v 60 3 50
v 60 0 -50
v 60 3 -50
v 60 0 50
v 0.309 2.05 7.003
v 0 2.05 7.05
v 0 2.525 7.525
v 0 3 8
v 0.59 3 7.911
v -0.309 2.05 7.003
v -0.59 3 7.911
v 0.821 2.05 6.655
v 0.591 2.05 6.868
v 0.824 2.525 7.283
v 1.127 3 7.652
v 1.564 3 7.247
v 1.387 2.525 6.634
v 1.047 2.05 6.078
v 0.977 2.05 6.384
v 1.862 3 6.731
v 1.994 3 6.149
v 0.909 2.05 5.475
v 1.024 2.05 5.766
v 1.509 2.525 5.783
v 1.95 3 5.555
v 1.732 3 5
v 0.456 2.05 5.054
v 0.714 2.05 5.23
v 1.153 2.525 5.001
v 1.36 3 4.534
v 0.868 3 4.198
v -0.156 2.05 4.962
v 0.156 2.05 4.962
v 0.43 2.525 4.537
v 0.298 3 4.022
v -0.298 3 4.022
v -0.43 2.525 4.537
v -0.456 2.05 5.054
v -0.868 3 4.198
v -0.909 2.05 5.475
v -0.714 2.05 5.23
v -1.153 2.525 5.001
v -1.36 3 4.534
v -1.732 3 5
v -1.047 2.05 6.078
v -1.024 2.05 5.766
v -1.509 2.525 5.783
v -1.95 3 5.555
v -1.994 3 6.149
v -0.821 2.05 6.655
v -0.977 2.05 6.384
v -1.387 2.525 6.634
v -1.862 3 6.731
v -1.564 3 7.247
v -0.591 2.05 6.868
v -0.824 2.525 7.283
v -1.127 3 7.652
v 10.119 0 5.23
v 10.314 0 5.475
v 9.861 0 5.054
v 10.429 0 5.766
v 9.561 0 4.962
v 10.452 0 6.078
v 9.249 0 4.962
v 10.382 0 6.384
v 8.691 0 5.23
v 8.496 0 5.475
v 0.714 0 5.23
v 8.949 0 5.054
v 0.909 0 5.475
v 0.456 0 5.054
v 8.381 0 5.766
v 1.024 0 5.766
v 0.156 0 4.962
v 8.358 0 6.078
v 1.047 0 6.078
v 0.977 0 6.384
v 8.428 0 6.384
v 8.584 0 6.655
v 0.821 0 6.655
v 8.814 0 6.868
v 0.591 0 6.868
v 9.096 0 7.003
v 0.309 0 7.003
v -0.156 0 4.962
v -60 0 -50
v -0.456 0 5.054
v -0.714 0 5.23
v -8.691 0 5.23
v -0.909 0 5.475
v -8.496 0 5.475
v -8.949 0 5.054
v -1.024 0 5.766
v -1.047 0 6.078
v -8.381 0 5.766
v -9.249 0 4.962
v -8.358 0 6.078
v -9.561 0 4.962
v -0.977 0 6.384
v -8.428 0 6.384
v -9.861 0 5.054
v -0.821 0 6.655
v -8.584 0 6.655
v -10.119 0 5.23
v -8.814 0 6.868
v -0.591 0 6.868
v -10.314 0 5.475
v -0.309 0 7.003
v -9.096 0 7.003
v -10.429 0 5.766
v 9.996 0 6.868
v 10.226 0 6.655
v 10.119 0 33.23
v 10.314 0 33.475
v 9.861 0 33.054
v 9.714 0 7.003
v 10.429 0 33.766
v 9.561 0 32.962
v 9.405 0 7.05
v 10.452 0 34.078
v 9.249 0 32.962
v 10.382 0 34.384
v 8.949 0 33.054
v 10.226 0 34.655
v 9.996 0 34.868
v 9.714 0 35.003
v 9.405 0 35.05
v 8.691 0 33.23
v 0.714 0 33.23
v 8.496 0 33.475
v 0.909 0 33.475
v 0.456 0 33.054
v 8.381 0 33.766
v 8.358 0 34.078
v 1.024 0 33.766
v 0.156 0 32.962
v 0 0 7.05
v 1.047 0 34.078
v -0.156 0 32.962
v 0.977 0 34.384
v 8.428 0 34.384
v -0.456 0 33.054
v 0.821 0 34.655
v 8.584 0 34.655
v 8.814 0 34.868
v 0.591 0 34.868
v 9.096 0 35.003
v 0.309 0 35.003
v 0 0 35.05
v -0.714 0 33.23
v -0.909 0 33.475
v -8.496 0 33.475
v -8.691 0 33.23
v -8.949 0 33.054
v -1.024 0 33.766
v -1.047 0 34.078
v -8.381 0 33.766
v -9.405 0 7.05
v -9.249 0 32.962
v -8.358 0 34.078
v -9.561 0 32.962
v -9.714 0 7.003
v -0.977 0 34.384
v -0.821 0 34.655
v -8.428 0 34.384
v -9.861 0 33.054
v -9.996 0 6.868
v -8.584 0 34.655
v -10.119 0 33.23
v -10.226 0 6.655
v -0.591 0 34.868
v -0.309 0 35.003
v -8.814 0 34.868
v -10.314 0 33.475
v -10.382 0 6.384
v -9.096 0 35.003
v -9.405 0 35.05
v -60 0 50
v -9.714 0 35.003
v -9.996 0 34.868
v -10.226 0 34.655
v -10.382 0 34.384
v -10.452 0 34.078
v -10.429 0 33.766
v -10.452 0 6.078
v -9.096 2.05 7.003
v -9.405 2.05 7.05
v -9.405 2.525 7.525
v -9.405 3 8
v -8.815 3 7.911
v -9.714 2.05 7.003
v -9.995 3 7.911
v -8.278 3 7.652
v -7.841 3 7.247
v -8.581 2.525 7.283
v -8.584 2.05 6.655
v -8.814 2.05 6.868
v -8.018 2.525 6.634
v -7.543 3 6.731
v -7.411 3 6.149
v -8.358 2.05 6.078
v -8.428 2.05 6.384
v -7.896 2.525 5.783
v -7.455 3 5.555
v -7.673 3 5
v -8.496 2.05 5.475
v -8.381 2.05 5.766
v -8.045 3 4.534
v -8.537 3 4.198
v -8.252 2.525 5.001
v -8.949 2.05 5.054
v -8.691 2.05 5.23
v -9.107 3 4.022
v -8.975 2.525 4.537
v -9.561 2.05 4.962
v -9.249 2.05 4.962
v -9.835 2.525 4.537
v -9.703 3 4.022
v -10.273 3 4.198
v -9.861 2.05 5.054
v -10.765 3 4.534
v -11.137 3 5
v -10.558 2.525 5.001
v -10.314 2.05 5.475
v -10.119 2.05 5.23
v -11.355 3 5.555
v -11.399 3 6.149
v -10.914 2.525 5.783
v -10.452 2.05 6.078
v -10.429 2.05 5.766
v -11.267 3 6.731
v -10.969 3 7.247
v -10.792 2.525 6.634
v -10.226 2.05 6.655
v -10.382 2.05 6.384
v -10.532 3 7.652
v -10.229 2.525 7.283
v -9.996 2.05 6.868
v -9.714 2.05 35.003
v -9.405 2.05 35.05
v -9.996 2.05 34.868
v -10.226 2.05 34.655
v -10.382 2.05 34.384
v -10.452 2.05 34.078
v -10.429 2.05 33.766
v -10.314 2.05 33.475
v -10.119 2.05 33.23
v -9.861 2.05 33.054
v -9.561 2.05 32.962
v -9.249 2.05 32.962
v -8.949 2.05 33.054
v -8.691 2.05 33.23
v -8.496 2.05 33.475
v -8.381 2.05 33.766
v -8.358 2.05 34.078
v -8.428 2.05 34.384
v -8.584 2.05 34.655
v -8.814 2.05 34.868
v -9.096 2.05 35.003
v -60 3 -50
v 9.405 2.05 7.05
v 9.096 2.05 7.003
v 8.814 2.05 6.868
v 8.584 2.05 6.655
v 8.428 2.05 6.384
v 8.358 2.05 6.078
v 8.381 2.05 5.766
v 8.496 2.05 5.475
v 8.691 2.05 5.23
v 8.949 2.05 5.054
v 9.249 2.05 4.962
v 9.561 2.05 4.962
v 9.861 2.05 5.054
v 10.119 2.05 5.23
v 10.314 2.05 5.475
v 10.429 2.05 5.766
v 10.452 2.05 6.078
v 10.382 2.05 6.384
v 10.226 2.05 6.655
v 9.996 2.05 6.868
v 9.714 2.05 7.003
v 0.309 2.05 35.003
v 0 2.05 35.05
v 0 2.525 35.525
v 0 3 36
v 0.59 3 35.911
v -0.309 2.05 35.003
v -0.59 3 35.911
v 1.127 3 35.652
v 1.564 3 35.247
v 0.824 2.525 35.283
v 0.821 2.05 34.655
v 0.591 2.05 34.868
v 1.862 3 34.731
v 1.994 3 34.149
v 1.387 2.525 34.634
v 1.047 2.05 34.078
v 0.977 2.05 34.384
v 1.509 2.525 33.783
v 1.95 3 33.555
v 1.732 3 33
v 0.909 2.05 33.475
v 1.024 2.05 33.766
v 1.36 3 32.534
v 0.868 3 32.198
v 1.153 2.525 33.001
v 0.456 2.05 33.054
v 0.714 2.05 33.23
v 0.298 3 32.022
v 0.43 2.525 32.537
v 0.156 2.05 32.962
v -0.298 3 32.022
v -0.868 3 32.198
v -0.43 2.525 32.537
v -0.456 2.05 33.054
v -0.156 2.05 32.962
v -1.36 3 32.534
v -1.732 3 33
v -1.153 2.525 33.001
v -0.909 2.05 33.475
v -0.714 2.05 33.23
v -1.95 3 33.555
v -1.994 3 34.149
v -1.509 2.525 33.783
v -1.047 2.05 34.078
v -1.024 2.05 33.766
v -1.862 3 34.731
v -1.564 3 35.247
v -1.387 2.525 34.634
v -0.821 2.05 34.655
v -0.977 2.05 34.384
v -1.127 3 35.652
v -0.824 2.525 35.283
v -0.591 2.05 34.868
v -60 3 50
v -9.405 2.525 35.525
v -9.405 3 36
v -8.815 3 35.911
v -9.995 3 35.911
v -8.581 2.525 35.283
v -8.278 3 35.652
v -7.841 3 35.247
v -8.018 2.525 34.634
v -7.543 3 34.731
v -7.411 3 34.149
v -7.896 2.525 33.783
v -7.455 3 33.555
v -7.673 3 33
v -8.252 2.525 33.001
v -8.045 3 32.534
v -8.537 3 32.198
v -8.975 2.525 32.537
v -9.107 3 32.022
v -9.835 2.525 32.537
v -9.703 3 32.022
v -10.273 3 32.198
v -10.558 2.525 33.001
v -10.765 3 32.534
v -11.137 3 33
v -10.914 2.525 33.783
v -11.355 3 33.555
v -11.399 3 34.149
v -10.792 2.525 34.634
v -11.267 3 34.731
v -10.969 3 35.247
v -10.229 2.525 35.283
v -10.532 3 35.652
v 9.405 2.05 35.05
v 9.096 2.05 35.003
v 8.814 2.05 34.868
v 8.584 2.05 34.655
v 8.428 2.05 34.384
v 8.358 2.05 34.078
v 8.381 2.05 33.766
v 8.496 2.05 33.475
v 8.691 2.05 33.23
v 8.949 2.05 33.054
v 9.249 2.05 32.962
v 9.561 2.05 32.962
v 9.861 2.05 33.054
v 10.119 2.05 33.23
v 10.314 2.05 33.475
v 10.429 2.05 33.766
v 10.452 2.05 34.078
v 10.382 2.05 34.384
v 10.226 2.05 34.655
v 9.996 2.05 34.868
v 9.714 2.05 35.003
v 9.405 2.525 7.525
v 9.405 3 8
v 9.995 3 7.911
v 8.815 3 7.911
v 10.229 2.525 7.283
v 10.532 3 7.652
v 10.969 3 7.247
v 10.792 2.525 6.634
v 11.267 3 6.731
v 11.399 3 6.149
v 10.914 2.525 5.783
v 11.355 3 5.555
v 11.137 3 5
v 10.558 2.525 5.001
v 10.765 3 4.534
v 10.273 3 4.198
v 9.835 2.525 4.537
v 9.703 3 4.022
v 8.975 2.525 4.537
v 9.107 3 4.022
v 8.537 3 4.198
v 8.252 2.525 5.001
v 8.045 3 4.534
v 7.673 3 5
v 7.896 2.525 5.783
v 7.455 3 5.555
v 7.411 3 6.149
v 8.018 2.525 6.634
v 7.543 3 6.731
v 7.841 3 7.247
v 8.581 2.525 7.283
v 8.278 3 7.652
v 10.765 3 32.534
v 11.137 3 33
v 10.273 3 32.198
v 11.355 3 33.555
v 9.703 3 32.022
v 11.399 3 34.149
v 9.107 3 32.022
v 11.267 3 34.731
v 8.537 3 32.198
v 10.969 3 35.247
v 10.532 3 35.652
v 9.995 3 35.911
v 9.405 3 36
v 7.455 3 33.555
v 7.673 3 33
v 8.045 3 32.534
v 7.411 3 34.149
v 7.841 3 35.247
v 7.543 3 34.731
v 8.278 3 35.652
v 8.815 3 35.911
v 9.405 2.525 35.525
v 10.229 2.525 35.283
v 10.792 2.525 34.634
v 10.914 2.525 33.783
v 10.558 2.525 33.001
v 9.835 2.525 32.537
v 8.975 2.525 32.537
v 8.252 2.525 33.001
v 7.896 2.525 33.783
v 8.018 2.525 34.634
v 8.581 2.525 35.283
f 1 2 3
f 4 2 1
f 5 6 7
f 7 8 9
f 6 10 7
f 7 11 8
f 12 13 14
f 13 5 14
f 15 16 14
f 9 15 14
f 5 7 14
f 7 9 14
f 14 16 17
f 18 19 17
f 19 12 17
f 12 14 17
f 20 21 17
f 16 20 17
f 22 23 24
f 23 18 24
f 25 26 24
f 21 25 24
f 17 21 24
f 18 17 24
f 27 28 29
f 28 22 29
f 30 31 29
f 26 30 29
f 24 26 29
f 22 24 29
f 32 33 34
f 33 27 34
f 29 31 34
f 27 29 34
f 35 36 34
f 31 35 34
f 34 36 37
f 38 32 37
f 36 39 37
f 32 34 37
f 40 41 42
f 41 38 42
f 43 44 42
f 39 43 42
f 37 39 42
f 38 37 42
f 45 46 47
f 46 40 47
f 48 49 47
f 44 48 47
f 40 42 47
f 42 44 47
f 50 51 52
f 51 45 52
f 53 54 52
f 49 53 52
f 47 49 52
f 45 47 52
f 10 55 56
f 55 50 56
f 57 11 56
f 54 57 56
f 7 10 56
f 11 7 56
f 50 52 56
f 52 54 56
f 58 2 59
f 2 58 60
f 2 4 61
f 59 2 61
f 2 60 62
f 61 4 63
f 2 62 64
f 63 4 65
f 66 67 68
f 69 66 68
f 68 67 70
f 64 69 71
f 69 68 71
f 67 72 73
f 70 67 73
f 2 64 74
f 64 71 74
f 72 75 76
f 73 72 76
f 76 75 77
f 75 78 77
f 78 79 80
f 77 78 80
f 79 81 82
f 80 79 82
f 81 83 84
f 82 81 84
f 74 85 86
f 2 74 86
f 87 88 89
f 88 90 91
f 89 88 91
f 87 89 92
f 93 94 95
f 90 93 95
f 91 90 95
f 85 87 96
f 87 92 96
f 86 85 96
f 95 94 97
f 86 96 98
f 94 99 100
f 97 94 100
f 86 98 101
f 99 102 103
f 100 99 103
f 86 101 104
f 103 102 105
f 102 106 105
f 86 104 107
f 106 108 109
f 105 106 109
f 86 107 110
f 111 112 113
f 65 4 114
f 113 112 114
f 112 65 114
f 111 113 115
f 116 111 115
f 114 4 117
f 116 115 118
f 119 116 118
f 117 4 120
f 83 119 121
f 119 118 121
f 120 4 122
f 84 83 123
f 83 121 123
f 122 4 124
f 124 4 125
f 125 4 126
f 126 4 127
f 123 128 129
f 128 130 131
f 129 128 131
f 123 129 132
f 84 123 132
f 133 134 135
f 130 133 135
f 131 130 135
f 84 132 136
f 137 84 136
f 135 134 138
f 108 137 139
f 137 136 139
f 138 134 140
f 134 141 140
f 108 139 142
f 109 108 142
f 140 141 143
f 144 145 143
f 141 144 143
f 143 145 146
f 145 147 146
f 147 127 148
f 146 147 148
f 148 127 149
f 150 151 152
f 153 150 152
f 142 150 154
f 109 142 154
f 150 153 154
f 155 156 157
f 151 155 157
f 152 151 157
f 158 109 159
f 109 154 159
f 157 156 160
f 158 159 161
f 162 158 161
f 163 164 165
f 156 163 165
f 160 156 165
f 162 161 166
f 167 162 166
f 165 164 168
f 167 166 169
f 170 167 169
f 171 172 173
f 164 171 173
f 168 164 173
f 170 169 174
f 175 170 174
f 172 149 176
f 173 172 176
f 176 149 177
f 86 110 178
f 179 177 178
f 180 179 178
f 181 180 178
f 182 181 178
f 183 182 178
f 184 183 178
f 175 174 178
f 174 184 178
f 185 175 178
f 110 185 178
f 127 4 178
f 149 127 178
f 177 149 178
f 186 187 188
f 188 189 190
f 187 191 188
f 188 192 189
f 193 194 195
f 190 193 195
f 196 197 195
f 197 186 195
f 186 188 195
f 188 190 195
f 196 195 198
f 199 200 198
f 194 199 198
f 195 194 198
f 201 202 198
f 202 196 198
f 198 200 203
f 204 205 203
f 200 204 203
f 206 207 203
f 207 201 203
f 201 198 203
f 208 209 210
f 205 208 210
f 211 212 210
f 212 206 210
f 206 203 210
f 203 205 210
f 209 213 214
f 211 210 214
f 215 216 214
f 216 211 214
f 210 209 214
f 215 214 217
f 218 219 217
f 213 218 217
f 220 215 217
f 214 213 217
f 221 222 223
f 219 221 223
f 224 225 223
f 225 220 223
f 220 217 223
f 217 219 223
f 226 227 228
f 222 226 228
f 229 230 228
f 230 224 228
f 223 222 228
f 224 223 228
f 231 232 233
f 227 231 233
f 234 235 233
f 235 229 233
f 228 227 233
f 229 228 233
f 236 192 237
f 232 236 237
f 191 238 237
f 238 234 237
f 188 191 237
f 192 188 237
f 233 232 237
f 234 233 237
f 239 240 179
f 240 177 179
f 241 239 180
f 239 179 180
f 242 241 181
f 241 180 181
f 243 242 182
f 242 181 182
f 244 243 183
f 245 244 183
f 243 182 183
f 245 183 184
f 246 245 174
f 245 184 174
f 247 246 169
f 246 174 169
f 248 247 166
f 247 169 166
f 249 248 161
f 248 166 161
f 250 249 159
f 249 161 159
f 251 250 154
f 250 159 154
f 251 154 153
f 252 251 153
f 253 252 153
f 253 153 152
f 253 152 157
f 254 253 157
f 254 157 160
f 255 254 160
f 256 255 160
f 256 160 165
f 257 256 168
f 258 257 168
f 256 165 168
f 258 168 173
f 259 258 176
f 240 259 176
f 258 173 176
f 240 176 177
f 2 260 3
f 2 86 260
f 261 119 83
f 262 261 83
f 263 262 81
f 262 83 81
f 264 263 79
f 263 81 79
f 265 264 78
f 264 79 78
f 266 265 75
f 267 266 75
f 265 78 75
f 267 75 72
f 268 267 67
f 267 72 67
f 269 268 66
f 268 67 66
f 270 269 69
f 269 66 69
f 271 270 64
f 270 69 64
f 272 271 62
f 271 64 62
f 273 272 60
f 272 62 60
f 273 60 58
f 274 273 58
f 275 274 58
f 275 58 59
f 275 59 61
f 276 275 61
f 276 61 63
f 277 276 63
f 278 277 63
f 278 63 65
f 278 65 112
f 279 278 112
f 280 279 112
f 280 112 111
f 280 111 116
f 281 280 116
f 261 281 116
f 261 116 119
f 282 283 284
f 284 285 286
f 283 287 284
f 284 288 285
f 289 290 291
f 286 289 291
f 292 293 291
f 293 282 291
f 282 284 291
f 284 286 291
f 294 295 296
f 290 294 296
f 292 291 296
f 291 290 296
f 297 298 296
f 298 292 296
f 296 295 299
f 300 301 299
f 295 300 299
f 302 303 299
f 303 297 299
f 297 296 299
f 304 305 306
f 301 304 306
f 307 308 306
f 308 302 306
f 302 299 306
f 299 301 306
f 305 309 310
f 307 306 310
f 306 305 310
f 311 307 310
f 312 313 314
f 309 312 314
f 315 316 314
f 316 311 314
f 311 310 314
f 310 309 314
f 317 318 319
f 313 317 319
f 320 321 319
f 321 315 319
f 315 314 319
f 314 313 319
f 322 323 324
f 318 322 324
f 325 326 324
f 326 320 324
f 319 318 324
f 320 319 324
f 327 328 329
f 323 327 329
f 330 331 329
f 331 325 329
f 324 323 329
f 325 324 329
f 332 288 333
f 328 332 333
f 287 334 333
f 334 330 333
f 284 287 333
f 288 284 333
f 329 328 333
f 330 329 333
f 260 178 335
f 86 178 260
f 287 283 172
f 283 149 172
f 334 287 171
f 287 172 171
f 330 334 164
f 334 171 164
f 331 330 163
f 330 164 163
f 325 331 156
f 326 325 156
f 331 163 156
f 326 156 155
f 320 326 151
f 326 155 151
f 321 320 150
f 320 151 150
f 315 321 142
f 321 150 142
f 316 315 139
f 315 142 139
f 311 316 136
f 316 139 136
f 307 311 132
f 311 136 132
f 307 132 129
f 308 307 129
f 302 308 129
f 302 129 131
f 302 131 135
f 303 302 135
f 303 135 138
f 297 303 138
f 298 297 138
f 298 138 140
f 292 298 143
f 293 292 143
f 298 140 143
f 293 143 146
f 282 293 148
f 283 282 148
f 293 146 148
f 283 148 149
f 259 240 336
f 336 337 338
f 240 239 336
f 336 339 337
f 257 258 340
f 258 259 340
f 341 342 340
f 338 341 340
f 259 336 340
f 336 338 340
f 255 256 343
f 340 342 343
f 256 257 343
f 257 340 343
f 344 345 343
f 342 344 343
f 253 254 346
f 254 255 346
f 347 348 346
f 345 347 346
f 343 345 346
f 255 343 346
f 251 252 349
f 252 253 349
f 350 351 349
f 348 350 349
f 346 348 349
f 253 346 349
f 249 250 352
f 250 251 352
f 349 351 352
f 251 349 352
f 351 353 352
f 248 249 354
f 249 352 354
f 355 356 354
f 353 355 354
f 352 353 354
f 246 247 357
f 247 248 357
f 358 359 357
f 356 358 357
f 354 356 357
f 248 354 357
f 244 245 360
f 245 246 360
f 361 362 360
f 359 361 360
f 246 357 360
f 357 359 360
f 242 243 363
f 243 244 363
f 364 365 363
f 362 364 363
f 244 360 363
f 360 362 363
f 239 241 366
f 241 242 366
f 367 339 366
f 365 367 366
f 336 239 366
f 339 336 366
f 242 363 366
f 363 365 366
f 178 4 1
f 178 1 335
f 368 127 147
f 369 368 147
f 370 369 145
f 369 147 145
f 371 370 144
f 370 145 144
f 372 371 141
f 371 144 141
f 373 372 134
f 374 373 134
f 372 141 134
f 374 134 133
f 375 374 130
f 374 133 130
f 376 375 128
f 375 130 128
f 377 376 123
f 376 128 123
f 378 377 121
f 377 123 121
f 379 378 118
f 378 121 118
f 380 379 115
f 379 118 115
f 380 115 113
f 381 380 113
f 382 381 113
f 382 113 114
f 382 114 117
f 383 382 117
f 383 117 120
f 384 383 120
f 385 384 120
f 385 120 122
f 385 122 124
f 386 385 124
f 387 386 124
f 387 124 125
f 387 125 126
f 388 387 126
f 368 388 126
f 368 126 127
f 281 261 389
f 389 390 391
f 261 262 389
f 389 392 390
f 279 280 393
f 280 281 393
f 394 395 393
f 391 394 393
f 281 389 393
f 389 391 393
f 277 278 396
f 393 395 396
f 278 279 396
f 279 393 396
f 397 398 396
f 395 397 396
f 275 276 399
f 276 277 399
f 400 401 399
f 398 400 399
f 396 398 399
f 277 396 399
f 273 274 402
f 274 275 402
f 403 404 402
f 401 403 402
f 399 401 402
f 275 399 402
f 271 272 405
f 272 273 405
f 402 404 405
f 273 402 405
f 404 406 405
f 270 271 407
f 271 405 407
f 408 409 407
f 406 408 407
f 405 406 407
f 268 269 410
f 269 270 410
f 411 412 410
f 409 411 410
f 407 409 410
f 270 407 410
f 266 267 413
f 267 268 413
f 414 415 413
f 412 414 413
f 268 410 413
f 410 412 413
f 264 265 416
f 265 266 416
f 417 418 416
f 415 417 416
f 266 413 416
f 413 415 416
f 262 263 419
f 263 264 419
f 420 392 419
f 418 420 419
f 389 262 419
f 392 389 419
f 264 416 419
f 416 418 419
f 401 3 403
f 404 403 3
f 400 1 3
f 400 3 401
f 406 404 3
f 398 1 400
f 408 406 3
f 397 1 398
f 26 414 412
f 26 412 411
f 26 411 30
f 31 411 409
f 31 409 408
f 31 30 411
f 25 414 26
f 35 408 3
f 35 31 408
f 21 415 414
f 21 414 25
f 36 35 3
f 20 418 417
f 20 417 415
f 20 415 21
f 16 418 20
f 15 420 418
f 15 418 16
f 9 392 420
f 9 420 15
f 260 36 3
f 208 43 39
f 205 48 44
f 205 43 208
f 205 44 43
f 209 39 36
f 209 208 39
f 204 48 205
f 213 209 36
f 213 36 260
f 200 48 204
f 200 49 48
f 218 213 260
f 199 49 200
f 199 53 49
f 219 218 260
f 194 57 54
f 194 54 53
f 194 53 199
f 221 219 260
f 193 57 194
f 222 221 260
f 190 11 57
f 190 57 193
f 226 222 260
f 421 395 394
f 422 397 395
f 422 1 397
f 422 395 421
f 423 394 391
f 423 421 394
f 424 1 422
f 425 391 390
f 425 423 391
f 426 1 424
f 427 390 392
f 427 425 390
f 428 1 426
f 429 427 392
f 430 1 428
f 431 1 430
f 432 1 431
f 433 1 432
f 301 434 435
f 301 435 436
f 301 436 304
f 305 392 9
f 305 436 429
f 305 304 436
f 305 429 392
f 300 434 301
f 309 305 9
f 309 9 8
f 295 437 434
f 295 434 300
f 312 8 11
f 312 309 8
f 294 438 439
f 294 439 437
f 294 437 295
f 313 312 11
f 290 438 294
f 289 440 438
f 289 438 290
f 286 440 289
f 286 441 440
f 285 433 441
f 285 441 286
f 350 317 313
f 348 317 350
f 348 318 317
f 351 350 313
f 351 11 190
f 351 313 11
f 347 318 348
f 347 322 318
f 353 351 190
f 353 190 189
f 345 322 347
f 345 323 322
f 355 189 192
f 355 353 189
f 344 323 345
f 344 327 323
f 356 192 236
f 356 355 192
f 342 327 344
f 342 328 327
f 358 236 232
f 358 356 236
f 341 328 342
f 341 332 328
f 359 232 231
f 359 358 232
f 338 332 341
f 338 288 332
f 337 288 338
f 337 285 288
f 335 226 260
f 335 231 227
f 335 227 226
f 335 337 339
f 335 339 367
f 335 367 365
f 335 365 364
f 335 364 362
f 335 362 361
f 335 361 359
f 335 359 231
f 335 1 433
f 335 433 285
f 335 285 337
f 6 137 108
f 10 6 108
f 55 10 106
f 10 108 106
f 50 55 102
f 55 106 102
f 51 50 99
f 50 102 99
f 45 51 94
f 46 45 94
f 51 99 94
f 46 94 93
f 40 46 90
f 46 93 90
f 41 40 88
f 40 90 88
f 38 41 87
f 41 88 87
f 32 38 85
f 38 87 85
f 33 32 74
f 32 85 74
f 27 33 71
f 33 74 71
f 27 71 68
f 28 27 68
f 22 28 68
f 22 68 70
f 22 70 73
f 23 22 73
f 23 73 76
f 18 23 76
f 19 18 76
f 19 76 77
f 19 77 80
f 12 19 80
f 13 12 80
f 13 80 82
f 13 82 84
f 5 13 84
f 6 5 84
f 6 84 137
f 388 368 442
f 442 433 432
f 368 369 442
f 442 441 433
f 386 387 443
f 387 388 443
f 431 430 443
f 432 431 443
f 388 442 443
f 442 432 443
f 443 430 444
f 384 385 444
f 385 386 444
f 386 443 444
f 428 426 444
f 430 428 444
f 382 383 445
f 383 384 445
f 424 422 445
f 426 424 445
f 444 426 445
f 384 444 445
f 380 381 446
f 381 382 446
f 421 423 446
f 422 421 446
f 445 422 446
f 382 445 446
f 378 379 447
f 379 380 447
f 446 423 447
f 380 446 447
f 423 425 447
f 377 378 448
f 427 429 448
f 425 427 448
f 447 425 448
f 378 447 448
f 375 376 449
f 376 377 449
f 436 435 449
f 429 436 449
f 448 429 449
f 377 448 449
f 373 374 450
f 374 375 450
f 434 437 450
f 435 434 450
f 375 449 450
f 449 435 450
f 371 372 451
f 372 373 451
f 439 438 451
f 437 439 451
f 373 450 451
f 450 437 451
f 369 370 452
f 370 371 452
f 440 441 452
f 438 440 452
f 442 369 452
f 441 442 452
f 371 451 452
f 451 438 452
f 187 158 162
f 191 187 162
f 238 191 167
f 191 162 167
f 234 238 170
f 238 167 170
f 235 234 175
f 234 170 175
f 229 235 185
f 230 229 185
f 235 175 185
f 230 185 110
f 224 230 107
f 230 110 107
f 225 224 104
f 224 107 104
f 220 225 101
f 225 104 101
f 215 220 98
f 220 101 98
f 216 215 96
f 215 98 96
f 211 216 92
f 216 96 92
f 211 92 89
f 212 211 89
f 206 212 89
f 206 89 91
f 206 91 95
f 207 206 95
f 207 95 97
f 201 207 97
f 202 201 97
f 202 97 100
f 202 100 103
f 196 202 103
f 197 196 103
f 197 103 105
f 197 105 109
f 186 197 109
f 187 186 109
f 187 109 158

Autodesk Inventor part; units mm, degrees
ref_plane "YZ Plane" through (0, 0, 0) normal (1, 0, 0) x (0, 1, 0)
ref_plane "XZ Plane" through (0, 0, 0) normal (0, 1, 0) x (-1, 0, 0)
ref_plane "XY Plane" through (0, 0, 0) normal (0, 0, 1) x (1, 0, 0)
sketch "Sketch1" plane through (0, 0, 0) normal (0, 1, 0) x (-1, 0, 0)
  line L0 (60, -50) -> (-60, -50)
  line L1 (-60, -50) -> (-60, 50)
  line L2 (-60, 50) -> (60, 50)
  line L3 (60, 50) -> (60, -50)
  point P0 (0, 0)
  dimension "d0" = 120
  dimension "d1" = 100
  dimension "d2" = 50
  dimension "d3" = 60
extrude "Plate1" add sketch "Sketch1" along normal blind 3
sketch "Sketch3" plane through (0, 3, 0) normal (0, 1, 0) x (1, 0, 0)
  circle A0 centre (9.405, -34) radius 1.05 projected
  circle A1 centre (9.405, -6) radius 1.05 projected
  circle A2 centre (0, -34) radius 1.05 projected
  circle A3 centre (0, -6) radius 1.05 projected
  circle A4 centre (-9.405, -34) radius 1.05 projected
  circle A5 centre (-9.405, -6) radius 1.05 projected
  line L0 (15.405, 0) -> (15.405, -40) projected
  line L1 (-15.405, -40) -> (15.405, -40) projected
  line L2 (-15.405, -40) -> (-15.405, 0) projected
  line L3 (15.405, 0) -> (-15.405, 0) projected
  point P0 (0, 0)
hole "Hole1" at (-9.405, 3, 6) at (0, 3, 6) at (9.405, 3, 6) at (9.405, 3, 34) at (0, 3, 34) at (-9.405, 3, 34) direction (0, -1, 0) diameter 2.1 depth 3 countersink diameter 4 countersink angle 90
equation "\"d20\" = Thickness"
equation "\"d4\" = Thickness"
equation "\"BendReliefWidth\" = Thickness"
equation "\"BendReliefDepth\" = 0.5 * Thickness"
equation "\"CornerReliefSize\" = 4 * Thickness"
equation "\"MinimumRemnant\" = 2 * Thickness"
equation "\"TransitionRadius\" = BendRadius"
equation "\"JacobiRadiusSize\" = BendRadius"
equation "\"GapSize\" = Thickness"
equation "\"Thickness\" = 3"
equation "\"BendRadius\" = 0.31"
properties part number "axis_12_bottom_frame(bottom)" material "Aluminum 6061-AHC"
